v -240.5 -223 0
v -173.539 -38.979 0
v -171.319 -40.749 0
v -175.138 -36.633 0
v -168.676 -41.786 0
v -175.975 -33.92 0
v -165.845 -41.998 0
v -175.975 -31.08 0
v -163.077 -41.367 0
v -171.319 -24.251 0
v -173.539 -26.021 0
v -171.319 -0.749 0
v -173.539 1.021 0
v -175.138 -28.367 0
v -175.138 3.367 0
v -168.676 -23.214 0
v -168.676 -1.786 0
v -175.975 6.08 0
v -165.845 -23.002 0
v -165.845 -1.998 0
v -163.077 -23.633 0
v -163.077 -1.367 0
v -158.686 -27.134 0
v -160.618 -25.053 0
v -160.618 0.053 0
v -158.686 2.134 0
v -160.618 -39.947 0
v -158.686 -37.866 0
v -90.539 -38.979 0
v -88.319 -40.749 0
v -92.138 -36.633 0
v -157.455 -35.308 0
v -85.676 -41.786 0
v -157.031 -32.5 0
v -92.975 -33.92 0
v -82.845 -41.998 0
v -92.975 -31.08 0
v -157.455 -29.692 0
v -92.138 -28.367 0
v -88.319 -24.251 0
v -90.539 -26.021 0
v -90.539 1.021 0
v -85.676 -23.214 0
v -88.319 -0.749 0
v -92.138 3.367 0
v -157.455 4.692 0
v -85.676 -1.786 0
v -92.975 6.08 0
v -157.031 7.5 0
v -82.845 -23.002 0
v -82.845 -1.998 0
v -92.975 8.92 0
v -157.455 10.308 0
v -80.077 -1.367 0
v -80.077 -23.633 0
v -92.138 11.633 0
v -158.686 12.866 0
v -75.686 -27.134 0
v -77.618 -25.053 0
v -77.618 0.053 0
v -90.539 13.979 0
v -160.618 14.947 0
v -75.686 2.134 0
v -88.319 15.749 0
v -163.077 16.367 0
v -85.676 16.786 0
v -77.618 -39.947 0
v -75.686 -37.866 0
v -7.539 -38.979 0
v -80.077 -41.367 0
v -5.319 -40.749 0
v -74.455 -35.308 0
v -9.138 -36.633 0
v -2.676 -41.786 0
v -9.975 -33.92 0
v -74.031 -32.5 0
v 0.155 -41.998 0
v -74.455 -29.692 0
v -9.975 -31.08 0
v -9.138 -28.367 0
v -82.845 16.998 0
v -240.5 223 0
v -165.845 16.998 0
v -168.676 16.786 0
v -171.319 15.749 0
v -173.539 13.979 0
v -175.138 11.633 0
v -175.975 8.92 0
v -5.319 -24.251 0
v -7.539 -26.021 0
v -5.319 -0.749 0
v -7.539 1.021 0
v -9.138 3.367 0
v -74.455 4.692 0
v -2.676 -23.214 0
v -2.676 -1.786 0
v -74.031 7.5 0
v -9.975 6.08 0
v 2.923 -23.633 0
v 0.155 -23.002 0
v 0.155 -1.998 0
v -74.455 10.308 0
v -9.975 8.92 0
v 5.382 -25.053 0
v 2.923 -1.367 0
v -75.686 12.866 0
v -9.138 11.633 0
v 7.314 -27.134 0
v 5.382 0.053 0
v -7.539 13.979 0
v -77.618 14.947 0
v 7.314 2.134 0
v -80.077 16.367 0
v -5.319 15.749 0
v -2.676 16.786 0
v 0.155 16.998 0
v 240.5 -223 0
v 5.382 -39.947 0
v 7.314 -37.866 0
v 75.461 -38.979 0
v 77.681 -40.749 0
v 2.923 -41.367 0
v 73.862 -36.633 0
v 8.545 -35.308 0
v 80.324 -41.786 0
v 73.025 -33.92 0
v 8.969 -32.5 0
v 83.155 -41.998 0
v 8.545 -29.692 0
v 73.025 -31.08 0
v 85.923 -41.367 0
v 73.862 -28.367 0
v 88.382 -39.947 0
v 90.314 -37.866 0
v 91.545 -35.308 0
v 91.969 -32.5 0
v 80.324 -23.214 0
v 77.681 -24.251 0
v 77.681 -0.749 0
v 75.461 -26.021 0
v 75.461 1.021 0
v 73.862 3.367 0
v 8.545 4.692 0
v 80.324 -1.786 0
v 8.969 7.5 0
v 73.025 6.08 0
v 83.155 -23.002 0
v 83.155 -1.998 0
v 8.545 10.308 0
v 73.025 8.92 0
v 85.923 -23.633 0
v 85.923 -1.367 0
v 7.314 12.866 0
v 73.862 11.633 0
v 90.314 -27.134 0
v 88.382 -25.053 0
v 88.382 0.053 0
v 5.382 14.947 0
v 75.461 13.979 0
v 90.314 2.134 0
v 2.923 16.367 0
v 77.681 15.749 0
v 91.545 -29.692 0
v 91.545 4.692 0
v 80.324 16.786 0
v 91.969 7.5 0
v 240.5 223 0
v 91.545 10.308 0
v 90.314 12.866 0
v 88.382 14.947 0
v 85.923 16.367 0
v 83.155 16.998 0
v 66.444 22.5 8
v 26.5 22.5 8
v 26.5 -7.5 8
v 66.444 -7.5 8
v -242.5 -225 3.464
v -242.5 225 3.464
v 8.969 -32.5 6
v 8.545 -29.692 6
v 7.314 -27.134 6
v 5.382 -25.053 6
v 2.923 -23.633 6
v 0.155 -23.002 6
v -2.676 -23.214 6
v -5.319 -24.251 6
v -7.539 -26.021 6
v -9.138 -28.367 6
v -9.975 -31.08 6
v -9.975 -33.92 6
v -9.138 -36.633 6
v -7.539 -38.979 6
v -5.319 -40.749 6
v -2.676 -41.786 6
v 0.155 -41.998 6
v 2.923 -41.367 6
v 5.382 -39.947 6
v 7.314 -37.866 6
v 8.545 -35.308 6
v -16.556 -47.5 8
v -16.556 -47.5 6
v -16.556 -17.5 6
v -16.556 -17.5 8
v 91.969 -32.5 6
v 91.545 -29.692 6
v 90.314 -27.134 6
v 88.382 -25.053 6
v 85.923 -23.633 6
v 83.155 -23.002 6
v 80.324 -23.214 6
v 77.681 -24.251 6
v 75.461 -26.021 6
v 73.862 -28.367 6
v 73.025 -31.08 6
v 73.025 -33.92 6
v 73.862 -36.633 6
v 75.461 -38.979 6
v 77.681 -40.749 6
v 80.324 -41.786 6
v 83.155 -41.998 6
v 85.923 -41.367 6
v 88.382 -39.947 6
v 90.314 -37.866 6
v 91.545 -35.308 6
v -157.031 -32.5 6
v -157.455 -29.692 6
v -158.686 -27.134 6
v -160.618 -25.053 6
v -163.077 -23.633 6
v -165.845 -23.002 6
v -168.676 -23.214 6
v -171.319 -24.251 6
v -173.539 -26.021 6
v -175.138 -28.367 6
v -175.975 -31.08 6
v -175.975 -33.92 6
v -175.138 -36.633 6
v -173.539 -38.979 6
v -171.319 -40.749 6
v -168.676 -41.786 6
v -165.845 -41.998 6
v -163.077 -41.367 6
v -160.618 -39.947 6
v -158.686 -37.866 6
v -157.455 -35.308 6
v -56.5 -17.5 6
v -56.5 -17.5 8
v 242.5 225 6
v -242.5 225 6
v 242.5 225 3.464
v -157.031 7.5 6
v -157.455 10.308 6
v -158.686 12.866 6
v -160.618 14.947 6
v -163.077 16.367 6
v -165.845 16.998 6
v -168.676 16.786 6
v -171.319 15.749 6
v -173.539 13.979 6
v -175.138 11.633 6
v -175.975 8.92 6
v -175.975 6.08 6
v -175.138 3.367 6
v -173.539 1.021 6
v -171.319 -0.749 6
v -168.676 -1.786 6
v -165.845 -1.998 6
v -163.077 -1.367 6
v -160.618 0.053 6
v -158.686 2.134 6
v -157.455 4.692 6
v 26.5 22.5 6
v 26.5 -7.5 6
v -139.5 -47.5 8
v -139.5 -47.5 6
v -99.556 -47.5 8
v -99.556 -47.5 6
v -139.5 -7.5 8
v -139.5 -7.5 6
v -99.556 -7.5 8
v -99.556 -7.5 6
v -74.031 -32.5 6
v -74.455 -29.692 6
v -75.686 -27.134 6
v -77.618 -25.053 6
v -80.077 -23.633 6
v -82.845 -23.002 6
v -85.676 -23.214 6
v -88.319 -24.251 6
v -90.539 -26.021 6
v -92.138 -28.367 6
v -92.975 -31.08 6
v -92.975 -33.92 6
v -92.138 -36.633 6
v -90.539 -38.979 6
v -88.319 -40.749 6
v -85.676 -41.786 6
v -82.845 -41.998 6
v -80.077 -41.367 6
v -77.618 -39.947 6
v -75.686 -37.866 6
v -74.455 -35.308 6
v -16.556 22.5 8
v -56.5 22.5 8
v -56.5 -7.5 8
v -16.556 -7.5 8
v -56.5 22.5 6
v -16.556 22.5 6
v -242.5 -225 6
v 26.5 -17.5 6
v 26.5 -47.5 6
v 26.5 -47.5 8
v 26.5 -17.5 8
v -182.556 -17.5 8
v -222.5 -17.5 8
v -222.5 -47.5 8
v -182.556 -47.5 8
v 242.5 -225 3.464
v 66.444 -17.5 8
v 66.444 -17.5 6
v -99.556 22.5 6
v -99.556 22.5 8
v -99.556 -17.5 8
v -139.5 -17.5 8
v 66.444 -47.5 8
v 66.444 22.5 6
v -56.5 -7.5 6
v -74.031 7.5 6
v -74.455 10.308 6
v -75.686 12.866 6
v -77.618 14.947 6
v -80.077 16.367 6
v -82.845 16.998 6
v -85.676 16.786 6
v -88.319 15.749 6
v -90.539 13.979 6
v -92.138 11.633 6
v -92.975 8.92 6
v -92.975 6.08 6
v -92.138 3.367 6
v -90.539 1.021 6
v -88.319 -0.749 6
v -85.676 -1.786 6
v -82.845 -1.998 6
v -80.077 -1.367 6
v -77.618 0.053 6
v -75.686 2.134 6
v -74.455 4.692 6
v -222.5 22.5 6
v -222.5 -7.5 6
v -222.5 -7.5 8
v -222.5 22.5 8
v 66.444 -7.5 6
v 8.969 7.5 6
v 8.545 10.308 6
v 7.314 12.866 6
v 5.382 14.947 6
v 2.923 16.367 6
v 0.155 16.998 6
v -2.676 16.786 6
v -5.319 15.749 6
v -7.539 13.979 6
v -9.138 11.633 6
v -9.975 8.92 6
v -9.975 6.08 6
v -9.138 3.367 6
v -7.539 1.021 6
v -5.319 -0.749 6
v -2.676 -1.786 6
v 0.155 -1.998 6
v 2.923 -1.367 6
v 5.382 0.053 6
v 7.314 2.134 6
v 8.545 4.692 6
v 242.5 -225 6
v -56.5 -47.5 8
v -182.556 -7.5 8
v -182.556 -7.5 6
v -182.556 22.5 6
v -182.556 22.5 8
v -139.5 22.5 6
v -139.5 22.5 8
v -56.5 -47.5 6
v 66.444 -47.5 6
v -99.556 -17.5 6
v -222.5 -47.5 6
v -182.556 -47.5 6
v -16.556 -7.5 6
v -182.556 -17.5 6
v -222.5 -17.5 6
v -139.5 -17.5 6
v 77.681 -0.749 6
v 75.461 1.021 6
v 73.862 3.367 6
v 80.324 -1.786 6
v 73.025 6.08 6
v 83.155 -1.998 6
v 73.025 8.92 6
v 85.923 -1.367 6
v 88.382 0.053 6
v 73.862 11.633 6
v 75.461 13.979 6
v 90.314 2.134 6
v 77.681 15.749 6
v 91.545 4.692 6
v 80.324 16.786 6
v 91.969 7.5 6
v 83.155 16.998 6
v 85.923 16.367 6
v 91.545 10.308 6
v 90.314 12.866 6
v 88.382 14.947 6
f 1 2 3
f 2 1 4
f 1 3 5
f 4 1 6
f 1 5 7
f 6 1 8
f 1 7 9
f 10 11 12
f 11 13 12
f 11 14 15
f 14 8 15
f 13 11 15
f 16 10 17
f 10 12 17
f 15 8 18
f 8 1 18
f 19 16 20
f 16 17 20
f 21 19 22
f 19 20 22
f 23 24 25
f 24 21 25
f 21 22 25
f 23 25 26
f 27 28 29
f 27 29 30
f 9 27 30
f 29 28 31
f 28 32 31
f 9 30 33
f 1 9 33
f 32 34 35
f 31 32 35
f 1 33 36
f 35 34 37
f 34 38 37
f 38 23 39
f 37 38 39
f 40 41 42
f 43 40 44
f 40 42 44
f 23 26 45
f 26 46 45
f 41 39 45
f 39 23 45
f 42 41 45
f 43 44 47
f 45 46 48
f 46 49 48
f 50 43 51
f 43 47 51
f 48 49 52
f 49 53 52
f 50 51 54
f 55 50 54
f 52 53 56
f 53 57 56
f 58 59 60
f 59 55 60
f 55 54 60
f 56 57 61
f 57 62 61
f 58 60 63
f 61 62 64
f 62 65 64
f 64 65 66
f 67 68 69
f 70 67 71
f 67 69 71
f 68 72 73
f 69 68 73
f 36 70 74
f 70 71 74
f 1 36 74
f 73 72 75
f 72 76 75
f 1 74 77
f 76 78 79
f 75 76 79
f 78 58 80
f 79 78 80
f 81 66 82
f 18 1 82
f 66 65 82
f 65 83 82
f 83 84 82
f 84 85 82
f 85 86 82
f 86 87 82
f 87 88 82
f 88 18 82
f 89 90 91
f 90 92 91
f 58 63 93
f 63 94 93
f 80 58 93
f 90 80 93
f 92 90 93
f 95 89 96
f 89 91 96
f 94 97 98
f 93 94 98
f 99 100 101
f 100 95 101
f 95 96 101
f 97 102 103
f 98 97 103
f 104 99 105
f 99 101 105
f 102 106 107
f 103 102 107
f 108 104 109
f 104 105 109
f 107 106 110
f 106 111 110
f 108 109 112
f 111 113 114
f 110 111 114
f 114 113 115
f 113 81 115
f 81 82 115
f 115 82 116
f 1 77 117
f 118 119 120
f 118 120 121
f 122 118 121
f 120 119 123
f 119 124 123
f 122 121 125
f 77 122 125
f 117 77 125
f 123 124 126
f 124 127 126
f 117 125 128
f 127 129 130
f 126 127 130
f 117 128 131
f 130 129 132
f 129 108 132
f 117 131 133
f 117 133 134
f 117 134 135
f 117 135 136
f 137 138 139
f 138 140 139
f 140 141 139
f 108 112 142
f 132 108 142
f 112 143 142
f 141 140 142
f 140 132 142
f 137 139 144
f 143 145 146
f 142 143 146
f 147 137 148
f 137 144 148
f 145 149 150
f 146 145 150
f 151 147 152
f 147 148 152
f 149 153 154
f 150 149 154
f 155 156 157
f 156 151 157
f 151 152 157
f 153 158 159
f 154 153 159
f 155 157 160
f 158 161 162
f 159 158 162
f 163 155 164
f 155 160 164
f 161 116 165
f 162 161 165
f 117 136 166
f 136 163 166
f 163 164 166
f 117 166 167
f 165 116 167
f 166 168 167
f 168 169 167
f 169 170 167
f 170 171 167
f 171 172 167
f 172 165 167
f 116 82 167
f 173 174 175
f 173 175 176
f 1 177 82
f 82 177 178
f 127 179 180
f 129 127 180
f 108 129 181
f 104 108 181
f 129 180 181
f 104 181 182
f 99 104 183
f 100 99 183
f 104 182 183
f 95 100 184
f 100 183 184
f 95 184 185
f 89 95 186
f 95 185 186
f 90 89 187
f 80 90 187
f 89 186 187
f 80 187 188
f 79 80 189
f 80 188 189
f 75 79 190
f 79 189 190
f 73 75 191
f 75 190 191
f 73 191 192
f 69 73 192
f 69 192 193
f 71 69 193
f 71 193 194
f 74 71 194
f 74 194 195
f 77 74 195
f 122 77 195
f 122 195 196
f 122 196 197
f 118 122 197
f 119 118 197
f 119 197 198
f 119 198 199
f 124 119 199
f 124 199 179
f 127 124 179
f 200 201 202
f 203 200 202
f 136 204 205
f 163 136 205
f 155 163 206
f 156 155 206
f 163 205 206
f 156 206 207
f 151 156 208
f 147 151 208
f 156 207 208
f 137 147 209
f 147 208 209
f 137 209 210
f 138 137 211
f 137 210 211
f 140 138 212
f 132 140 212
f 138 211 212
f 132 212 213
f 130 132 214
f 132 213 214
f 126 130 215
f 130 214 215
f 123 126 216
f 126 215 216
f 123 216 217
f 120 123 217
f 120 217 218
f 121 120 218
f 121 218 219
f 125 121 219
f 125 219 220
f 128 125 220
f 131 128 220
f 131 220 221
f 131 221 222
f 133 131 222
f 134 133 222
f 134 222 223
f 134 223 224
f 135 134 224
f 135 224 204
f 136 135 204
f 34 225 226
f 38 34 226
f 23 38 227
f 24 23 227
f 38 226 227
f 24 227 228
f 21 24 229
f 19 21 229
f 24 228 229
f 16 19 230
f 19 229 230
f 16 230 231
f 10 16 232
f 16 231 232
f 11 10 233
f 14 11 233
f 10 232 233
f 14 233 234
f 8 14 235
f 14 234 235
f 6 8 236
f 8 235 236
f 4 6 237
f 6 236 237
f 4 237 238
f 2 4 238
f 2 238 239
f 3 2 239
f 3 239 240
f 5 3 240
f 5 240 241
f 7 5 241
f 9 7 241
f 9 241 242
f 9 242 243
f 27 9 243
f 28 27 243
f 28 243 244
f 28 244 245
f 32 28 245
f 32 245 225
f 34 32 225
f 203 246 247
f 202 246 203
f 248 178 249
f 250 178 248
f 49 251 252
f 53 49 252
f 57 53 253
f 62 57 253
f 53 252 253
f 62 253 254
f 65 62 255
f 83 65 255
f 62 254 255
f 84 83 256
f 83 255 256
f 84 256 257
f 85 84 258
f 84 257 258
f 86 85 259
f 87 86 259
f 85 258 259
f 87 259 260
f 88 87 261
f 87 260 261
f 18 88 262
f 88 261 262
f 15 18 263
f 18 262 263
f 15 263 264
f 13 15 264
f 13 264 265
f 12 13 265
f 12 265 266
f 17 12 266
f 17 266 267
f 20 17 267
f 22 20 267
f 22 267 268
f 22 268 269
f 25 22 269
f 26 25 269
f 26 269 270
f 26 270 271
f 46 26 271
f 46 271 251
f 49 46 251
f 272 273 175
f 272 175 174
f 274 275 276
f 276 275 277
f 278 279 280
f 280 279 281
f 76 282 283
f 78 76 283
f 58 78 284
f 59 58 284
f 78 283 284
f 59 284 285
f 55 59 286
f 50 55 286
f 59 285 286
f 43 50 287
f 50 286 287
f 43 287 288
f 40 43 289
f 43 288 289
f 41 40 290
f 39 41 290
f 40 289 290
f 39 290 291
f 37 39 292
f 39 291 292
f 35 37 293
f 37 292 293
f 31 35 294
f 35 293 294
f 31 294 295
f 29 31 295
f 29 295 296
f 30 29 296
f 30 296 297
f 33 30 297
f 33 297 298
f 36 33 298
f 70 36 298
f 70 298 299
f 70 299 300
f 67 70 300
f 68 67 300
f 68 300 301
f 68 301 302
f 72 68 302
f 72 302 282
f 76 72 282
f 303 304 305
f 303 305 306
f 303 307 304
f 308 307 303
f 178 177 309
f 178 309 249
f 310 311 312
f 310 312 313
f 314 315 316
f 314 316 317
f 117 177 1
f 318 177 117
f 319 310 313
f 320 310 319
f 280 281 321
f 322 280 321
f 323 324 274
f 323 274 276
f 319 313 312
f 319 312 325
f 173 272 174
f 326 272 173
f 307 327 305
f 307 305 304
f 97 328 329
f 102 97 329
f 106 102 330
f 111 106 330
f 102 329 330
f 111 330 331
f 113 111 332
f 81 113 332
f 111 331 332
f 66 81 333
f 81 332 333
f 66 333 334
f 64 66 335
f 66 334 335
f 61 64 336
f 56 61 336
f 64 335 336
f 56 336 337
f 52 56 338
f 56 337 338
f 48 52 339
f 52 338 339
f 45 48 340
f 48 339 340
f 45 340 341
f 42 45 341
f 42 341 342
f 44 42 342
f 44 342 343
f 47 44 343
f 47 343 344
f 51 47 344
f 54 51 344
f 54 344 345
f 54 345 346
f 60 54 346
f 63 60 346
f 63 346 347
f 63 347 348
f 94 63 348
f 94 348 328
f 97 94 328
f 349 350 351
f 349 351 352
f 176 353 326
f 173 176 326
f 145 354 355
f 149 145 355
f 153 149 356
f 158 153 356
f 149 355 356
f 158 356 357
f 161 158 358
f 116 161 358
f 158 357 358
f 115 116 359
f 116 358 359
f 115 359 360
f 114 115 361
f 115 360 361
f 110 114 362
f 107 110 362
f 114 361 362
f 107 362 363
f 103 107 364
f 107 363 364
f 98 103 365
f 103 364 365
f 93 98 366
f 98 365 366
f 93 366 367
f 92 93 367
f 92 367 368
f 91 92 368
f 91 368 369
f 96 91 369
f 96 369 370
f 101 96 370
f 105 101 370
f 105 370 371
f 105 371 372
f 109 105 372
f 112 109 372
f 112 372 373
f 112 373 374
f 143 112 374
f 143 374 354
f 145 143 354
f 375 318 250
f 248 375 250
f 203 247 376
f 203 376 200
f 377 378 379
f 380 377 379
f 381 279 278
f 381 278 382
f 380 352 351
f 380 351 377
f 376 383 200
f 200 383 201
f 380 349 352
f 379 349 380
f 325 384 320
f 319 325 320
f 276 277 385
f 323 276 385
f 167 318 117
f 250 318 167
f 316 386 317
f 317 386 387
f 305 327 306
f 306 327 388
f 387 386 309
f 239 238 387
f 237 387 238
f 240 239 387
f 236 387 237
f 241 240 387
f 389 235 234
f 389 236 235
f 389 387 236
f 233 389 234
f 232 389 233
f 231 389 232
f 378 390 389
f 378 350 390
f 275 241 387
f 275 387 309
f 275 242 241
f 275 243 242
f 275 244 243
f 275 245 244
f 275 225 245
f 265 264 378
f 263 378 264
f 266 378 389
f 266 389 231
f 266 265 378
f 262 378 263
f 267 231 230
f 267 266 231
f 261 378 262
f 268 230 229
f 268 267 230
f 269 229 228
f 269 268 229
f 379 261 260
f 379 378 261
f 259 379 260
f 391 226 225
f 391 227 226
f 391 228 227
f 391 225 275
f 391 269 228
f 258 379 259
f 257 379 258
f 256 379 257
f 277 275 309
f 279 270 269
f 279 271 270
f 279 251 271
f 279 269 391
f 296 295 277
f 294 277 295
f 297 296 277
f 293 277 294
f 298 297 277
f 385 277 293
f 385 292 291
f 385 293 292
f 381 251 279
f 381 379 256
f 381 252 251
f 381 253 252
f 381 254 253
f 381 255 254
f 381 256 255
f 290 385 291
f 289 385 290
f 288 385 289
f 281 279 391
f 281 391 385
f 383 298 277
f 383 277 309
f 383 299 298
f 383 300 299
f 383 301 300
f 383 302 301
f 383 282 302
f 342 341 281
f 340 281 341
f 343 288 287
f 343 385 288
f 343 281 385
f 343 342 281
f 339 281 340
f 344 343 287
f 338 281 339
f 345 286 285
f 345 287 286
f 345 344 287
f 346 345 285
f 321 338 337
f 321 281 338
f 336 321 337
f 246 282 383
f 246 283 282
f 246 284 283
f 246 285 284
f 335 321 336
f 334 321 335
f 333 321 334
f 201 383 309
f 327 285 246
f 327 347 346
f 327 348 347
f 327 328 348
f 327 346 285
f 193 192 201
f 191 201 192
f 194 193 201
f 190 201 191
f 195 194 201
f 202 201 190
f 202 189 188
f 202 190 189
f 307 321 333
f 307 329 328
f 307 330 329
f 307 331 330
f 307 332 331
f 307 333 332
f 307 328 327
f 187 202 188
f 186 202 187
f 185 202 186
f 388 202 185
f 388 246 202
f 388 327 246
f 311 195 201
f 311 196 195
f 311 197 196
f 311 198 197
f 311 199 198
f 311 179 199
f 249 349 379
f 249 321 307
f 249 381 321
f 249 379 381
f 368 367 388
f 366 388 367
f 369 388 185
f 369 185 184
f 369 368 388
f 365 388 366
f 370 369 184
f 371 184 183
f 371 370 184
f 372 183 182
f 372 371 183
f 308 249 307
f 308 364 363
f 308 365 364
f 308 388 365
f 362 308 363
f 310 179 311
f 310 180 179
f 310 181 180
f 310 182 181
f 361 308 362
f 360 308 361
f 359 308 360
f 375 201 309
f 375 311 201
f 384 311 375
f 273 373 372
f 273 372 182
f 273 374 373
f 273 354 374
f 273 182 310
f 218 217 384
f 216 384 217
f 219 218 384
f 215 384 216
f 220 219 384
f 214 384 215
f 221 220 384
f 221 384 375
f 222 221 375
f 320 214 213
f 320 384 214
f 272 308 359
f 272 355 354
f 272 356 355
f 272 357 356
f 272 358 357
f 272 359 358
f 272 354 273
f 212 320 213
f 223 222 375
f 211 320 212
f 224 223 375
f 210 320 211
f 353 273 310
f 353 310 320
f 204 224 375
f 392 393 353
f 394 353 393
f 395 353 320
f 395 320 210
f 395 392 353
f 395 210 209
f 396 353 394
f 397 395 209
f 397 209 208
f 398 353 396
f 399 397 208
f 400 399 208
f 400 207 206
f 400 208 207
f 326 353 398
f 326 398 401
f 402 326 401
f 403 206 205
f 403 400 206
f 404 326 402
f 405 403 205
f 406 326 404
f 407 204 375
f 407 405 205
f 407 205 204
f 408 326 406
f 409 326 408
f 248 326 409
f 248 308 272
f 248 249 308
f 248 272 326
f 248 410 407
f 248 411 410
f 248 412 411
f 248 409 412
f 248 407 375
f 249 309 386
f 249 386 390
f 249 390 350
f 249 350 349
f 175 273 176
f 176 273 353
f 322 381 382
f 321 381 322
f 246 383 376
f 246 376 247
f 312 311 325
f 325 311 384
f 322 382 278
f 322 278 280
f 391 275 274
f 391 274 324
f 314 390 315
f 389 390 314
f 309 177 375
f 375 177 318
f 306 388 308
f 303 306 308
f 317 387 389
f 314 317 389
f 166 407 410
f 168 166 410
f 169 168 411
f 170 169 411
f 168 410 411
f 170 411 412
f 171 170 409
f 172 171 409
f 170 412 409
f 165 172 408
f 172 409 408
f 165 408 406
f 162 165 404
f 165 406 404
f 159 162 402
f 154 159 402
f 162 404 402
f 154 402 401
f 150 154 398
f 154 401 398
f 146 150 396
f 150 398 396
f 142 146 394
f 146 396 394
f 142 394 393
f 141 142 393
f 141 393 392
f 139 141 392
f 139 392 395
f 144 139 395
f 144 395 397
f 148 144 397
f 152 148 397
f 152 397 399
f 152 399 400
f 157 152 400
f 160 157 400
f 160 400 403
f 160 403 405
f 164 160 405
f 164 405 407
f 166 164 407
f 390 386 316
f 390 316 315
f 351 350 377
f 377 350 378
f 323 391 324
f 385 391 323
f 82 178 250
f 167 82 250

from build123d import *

# Parameters (mm, degrees)
ESBO_O1_W                 = 485
ESBO_O1_H                 = 450
RESSALTO_EXTRUS_O1_DEPTH  = 6
ESBO_O2_W                 = 39.943598922
ESBO_O2_H                 = 30
RESSALTO_EXTRUS_O2_DEPTH  = 2
PADR_O_LINEAR1_COUNT      = 4
PADR_O_LINEAR1_PITCH      = 83
PADR_O_LINEAR1_COUNT_DIR2 = 2
PADR_O_LINEAR1_PITCH_DIR2 = 40
ESBO_O3_R                 = 9.525
CORTE_EXTRUS_O1_DEPTH     = 331.858353378
PADR_O_LINEAR2_COUNT      = 4
PADR_O_LINEAR2_PITCH      = 83
PADR_O_LINEAR2_COUNT_DIR2 = 2
PADR_O_LINEAR2_PITCH_DIR2 = 40
CHANFRO1_SIZE             = 2
CHANFRO1_SIZE2            = 3.464101615


with BuildPart() as part:
    # Esboço1 → Ressalto-extrusão1 (new body)
    with BuildSketch(Plane.XY):
        Rectangle(ESBO_O1_W, ESBO_O1_H)
    extrude(amount=RESSALTO_EXTRUS_O1_DEPTH)

    # Esboço2 → Ressalto-extrusão2 (add)
    with BuildSketch(Plane.XY.offset(6)):
        with Locations((-202.528200539, 7.5)):
            Rectangle(ESBO_O2_W, ESBO_O2_H)
    ressalto_extrus_o2 = extrude(amount=RESSALTO_EXTRUS_O2_DEPTH)

    # Padrão linear1: Ressalto-extrus_o2 4 × 2
    with Locations(*[(i * PADR_O_LINEAR1_PITCH, -j * PADR_O_LINEAR1_PITCH_DIR2, 0) for i in range(PADR_O_LINEAR1_COUNT) for j in range(PADR_O_LINEAR1_COUNT_DIR2) if (i, j) != (0, 0)]):
        add(ressalto_extrus_o2)

    # Esboço3 → Corte-extrusão1 (cut, through all)
    with BuildSketch(Plane.XY.offset(6)):
        with Locations((-166.556401078, 7.5)):
            Circle(ESBO_O3_R)
    corte_extrus_o1 = extrude(amount=-CORTE_EXTRUS_O1_DEPTH, mode=Mode.SUBTRACT)

    # Padrão linear2: Corte-extrus_o1 4 × 2
    with Locations(*[(i * PADR_O_LINEAR2_PITCH, -j * PADR_O_LINEAR2_PITCH_DIR2, 0) for i in range(PADR_O_LINEAR2_COUNT) for j in range(PADR_O_LINEAR2_COUNT_DIR2) if (i, j) != (0, 0)]):
        add(corte_extrus_o1, mode=Mode.SUBTRACT)

    # Chanfro1
    chanfro1_edges = [part.edges().sort_by_distance(p)[0] for p in [
        (0, 225, 0),
        (242.5, 0, 0),
        (0, -225, 0),
        (-242.5, 0, 0),
    ]]
    chanfro1_side = [part.faces().sort_by_distance(p)[0] for p in [
        (0, -218.383921101, 0),
    ]]
    chamfer(chanfro1_edges, length=CHANFRO1_SIZE, length2=CHANFRO1_SIZE2, reference=chanfro1_side[0])


solid = part.part
